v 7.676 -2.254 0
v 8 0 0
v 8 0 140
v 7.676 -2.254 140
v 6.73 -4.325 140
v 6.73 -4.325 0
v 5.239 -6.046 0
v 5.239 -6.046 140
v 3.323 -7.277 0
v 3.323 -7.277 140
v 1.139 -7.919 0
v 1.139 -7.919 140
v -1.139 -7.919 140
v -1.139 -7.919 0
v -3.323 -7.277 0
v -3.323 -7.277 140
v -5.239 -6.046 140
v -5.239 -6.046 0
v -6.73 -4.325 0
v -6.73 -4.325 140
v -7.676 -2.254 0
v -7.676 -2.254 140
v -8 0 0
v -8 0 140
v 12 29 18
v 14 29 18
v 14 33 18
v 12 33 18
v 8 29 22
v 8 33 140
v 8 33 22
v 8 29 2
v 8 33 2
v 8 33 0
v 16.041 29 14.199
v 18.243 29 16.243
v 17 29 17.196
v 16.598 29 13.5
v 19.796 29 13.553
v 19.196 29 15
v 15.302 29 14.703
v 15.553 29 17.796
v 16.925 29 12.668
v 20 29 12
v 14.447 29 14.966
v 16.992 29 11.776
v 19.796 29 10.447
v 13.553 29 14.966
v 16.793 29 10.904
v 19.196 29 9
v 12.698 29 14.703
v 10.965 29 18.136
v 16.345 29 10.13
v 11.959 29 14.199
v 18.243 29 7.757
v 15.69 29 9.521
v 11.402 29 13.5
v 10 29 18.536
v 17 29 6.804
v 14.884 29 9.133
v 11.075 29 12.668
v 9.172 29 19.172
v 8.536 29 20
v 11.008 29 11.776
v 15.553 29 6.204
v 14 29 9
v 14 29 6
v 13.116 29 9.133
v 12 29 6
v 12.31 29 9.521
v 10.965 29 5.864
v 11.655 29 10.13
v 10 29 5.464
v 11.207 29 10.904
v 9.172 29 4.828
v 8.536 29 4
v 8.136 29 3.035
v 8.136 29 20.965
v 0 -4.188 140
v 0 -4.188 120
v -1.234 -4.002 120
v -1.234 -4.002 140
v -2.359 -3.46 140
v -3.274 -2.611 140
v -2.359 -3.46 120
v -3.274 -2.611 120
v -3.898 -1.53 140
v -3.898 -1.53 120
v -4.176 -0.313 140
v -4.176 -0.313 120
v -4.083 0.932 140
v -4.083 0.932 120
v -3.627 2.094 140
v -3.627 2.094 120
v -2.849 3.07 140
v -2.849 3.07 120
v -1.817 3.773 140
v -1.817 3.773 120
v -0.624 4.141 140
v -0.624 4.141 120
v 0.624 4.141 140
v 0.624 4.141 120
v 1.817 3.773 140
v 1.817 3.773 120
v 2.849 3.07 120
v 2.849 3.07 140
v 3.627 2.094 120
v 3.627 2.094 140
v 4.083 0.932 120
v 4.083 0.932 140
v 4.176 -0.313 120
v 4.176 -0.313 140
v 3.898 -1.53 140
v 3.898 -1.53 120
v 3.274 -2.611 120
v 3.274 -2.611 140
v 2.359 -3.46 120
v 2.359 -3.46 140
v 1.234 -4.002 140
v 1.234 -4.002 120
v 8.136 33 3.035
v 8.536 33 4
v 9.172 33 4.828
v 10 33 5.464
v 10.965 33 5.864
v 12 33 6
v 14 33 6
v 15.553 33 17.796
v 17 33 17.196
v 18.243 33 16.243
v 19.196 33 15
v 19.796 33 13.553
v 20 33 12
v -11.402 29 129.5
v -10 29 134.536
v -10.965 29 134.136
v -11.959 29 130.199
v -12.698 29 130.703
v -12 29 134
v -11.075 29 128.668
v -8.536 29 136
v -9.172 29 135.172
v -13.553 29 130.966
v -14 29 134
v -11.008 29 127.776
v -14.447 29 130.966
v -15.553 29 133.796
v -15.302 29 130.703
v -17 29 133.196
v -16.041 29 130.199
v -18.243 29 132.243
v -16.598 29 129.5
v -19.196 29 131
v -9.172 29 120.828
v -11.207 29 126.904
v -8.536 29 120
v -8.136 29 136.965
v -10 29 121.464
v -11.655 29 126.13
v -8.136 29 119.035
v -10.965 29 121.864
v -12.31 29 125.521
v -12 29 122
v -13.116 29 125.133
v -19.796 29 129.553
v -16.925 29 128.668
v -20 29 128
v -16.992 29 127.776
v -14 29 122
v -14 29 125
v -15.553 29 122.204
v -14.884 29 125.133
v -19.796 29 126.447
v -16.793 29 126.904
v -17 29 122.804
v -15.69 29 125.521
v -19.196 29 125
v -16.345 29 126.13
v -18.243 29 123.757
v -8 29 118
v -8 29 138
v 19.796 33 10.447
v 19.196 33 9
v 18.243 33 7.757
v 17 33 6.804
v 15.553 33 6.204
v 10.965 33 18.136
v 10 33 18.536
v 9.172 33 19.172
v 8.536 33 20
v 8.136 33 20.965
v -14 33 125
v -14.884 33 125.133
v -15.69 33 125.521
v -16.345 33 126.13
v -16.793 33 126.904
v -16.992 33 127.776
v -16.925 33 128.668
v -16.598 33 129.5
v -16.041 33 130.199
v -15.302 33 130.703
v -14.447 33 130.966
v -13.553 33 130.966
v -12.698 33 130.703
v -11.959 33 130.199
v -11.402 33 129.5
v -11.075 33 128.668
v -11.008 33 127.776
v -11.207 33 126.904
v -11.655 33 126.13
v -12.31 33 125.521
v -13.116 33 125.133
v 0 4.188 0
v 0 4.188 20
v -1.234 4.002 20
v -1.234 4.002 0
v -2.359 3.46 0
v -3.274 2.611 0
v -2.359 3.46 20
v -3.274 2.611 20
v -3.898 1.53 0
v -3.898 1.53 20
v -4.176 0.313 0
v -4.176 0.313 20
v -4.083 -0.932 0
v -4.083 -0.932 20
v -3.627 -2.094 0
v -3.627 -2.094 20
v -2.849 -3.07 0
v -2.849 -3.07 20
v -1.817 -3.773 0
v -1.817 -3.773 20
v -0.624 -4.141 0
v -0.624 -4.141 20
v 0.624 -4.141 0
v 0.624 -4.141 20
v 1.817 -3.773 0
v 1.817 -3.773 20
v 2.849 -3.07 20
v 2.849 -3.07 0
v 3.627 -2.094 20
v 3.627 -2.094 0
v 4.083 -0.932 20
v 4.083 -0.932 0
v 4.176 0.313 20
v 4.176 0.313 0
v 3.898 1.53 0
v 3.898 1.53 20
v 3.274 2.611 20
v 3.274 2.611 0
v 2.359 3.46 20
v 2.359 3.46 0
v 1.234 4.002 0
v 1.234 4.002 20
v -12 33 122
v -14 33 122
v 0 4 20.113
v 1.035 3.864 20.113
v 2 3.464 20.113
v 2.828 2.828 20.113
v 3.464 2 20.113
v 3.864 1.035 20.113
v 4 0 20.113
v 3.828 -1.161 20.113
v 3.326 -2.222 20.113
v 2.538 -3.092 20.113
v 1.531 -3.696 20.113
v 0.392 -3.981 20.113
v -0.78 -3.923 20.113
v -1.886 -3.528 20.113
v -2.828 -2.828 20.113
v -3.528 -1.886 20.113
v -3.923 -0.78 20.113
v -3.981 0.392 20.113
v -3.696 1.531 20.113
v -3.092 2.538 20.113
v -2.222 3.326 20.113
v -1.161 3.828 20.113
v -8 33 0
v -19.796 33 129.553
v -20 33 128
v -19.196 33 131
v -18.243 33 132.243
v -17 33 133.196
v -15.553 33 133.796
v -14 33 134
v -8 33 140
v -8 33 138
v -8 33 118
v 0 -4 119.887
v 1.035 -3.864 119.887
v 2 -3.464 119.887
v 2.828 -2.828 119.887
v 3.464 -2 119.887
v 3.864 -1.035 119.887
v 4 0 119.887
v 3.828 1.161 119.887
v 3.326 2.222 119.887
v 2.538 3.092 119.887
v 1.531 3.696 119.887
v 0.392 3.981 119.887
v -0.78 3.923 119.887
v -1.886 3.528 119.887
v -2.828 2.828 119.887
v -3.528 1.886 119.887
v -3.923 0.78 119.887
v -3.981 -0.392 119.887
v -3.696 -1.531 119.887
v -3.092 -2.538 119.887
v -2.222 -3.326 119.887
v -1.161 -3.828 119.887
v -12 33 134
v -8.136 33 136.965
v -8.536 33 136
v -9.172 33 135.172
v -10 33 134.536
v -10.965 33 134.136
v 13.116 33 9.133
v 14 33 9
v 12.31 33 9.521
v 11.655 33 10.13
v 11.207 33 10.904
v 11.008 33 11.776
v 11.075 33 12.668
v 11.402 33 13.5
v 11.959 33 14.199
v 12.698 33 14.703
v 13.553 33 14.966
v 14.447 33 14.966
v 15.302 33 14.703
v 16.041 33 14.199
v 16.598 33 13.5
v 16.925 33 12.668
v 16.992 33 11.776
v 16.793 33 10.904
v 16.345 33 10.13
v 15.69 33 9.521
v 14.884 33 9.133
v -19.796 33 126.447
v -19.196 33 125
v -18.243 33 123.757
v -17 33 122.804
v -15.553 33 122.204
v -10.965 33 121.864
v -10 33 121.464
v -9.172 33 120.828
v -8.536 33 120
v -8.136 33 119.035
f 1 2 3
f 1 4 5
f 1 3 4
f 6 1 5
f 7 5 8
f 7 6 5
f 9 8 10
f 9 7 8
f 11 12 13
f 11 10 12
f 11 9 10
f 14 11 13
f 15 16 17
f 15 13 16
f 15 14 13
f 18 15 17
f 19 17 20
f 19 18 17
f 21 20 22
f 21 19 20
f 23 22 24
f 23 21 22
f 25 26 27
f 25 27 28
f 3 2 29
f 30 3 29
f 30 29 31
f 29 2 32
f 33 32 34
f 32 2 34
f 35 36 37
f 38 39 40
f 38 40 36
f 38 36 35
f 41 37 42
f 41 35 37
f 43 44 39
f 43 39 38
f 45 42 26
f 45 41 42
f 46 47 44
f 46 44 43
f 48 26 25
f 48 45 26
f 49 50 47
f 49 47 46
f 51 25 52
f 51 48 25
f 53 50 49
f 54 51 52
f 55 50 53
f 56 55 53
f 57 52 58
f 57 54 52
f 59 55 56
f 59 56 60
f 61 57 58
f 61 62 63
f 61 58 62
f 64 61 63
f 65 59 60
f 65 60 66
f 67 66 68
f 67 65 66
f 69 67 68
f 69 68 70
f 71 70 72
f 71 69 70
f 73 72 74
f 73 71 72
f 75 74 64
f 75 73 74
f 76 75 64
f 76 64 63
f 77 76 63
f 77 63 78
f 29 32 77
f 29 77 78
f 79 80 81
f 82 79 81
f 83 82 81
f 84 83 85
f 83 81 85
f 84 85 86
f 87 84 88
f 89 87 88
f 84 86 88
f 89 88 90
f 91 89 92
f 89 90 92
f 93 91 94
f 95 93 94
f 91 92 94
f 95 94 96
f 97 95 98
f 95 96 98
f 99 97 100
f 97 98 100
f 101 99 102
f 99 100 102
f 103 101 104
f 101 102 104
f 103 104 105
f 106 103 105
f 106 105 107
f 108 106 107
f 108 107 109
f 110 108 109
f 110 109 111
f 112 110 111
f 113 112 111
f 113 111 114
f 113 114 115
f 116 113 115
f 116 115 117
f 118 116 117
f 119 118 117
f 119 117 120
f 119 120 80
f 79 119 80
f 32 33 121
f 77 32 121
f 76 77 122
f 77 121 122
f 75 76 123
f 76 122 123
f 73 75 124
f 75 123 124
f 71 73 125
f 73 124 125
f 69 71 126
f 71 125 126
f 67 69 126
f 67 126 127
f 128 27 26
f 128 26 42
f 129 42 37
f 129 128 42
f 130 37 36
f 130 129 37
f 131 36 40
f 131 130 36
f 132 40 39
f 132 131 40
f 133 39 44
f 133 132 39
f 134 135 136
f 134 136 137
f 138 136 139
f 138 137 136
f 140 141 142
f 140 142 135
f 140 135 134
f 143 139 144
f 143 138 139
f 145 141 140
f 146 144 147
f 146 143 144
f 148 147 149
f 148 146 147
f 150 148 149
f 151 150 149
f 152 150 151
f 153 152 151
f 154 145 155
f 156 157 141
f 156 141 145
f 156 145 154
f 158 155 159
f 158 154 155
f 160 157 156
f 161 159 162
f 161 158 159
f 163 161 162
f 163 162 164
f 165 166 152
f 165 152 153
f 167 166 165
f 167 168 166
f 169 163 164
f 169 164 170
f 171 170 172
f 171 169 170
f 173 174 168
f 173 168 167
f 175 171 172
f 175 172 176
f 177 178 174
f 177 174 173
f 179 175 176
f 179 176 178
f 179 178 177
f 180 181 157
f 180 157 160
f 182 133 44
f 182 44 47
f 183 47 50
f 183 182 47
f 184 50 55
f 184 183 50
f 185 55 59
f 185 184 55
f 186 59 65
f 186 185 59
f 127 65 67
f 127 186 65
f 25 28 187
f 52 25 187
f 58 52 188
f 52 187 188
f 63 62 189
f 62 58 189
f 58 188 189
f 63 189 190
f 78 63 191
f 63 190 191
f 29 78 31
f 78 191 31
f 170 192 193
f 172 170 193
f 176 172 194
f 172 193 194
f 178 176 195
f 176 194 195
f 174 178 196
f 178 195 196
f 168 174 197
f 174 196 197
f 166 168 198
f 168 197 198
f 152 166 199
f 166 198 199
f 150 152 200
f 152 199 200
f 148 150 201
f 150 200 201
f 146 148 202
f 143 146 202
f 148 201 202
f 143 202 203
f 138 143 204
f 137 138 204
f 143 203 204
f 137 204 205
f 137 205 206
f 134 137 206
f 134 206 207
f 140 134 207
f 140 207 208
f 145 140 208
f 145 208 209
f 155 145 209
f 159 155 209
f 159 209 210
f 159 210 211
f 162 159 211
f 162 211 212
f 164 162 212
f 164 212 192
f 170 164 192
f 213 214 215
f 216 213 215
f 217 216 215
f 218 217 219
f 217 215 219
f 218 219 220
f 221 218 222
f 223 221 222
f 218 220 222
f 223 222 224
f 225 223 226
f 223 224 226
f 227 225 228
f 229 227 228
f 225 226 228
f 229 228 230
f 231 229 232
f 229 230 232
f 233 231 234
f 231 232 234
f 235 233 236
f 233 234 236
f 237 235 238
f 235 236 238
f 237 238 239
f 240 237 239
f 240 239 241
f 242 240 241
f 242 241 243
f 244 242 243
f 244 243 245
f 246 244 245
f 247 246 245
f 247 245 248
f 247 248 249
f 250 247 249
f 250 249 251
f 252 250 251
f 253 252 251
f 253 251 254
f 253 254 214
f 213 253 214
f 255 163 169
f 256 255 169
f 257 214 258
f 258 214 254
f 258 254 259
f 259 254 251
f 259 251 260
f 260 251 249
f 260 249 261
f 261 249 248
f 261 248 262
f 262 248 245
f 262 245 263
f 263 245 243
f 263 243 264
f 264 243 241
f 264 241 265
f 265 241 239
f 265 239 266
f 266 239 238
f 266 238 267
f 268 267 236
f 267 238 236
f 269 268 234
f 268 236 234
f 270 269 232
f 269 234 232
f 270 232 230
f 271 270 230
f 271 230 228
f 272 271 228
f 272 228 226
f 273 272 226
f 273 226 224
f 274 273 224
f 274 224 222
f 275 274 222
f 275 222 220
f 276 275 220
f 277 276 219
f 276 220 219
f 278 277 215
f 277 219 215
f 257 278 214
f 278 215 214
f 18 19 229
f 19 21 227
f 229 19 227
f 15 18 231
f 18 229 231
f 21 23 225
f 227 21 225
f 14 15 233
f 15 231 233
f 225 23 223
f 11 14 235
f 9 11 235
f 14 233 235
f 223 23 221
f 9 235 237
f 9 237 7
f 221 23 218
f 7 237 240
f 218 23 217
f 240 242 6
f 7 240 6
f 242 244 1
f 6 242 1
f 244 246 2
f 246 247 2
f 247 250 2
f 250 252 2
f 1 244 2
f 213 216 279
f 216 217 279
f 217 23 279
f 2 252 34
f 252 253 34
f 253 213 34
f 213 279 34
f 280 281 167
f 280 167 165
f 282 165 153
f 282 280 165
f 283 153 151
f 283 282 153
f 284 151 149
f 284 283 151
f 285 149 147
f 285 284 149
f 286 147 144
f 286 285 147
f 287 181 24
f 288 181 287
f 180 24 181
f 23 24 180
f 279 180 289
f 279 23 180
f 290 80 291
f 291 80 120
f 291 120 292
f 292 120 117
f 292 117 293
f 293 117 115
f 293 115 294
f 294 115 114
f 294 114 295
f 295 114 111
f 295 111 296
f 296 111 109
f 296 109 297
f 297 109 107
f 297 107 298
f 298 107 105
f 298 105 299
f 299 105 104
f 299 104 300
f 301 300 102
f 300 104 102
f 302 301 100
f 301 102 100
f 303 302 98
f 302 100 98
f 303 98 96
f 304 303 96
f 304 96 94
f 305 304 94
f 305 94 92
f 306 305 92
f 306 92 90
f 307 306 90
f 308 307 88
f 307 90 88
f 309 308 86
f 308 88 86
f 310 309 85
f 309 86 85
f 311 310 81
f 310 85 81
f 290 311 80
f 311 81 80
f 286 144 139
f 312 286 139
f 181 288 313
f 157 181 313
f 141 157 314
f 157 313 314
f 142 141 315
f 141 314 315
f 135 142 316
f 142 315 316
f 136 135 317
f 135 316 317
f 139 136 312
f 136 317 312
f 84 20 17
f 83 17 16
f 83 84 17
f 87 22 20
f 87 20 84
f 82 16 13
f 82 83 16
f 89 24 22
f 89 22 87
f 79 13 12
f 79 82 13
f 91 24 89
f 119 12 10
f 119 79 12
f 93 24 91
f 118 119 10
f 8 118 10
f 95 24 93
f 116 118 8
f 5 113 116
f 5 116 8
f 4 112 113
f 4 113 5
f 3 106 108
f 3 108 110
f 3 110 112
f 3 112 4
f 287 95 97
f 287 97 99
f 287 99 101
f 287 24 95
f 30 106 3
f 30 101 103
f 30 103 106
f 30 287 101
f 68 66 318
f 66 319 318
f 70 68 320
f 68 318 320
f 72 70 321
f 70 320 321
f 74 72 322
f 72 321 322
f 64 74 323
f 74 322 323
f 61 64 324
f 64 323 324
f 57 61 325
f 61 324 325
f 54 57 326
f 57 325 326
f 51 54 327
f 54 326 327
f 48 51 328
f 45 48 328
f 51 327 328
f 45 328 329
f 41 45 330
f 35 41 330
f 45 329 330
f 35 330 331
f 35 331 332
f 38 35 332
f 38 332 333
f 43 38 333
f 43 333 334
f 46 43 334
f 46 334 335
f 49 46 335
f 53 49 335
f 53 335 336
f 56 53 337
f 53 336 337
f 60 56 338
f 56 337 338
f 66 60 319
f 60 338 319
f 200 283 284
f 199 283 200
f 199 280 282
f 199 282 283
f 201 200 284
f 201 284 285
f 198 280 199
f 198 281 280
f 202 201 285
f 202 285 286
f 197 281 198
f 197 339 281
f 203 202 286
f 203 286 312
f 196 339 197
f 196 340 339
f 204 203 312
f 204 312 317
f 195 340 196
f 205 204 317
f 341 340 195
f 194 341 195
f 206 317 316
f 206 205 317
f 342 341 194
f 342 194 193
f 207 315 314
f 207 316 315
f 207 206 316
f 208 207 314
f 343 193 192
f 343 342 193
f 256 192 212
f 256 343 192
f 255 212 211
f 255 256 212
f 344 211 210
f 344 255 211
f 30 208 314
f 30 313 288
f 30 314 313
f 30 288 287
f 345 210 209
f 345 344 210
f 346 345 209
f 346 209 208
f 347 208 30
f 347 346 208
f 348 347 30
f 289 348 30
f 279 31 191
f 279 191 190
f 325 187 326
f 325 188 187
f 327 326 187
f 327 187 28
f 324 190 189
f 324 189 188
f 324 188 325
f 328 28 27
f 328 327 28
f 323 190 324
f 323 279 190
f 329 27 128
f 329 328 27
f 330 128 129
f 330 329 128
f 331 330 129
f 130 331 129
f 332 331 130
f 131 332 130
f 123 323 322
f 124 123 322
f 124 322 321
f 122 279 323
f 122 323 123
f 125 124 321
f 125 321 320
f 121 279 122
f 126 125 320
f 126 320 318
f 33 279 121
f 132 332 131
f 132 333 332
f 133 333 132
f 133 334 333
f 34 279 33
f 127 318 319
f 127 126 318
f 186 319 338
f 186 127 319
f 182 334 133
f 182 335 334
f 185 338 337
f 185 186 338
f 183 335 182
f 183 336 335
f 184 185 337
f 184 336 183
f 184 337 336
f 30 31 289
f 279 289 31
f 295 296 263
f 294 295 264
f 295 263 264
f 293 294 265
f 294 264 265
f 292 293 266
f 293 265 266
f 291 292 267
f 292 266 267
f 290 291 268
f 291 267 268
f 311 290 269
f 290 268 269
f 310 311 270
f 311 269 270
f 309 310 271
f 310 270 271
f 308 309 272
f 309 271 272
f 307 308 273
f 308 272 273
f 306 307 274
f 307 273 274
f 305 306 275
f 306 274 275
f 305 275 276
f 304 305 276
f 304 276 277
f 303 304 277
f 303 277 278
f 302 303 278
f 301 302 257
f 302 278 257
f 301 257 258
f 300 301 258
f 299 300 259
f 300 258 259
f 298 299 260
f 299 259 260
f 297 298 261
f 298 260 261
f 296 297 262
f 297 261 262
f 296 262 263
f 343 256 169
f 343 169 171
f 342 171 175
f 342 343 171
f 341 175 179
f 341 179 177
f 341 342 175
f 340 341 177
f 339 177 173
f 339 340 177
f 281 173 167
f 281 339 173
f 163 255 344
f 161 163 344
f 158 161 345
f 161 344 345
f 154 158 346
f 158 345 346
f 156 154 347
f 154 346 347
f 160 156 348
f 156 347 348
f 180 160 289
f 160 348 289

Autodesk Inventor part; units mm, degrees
ref_plane "YZ Plane" through (0, 0, 0) normal (1, 0, 0) x (0, 1, 0)
ref_plane "XZ Plane" through (0, 0, 0) normal (0, 1, 0) x (-1, 0, 0)
ref_plane "XY Plane" through (0, 0, 0) normal (0, 0, 1) x (1, 0, 0)
sketch "Sketch7" plane through (0, 0, 0) normal (0, 0, 1) x (1, 0, 0)
  circle A0 centre (0, 0) radius 4
  arc A1 (-8, 0) -> (8, 0) centre (0, 0) ccw
  line L0 (-8, 29) -> (-20, 29)
  line L1 (-20, 29) -> (-20, 33)
  line L2 (-20, 33) -> (0, 33)
  line L3 (0, 33) -> (20, 33)
  line L4 (20, 33) -> (20, 29)
  line L5 (20, 29) -> (8, 29)
  line L6 (-8, 0) -> (-8, 29)
  line L7 (8, 0) -> (8, 29)
  dimension "d34" = 4
  dimension "d35" = 33
  dimension "d36" = 8
  dimension "d37" = 4
  dimension "d38" = 12
extrude "Extrusion6" add sketch "Sketch7" along normal blind 140
sketch "Sketch8" plane through (-20, 29, 0) normal (0, -1, 0) x (1, 0, 0)
  line L0 (12, 140) -> (0, 140) projected
  line L1 (0, 0) -> (0, 140) projected
  line L2 (0, 0) -> (12, 0) projected
  line L3 (12, 0) -> (12, 140) projected
  line L4 (40, 140) -> (28, 140) projected
  line L5 (28, 0) -> (28, 140) projected
  line L6 (28, 0) -> (40, 0) projected
  line L7 (40, 0) -> (40, 140) projected
  line L8 (0, 134) -> (12, 134)
  line L9 (12, 134) -> (12, 122)
  line L10 (12, 122) -> (0, 122)
  line L11 (0, 122) -> (0, 134)
  line L12 (28, 6) -> (40, 6)
  line L13 (40, 6) -> (40, 18)
  line L14 (40, 18) -> (28, 18)
  line L15 (28, 18) -> (28, 6)
  point P0 (20, 0)
  dimension "d41" = 12
  dimension "d42" = 6
  dimension "d43" = 6
extrude "Extrusion7" cut sketch "Sketch8" against normal blind 140 contours L3 L8 L1 L0 | L3 L2 L1 L10 | L7 L14 L5 L4 | L7 L6 L5 L12
fillet "Fillet1" radius 6 4 edges at (20, 31, 6) (20, 31, 18) (-20, 31, 134) (-20, 31, 122)
fillet "Fillet1" radius 4 4 edges at (-8, 31, 134) (-8, 31, 122) (8, 31, 6) (8, 31, 18)
sketch "Sketch9" plane through (-14, 29, 122) normal (0, -1, 0) x (1, 0, 0)
  arc A0 (0, 12) -> (0, 0) centre (0, 6) ccw projected
  arc A1 (28, -116) -> (28, -104) centre (28, -110) ccw projected
  line L0 (28, -104) -> (26, -104) projected
  arc A2 (22, -100) -> (26, -104) centre (26, -100) ccw projected
  line L1 (22, -120) -> (22, -100) projected
  arc A3 (26, -116) -> (22, -120) centre (26, -120) ccw projected
  line L2 (26, -116) -> (28, -116) projected
  point P0 (14, -122)
hole "Hole2" at (14, 29, 12) at (-14, 29, 128) direction (0, 1, 0) diameter 6 depth 8 tip angle 118 clearance for "Flat Head Machine Screw" size "M6" standard "Ansi Metric M Profile"
sketch "Sketch10" plane through (0, 0, 140) normal (0, 0, 1) x (1, 0, 0)
  arc A0 (-8, 0) -> (8, 0) centre (0, 0) ccw projected
hole "Hole3" at (0, 0, 140) direction (0, 0, -1) diameter 8.376 depth 20 tip angle 118 thread size "M10x1.5" class "6H" standard "ANSI Metric M Profile"
sketch "Sketch11" plane through (0, 0, 0) normal (0, 0, -1) x (-1, 0, 0)
  arc A0 (-8, 0) -> (8, 0) centre (0, 0) ccw projected
hole "Hole4" at (0, 0, 0) direction (0, 0, 1) diameter 8.376 depth 20 tip angle 118 thread size "M10x1.5" class "6H" standard "ANSI Metric M Profile"
ref_plane "Work Plane3" through (0, 0, 140) normal (1, 0, 0) x (0, 0, -1)
properties part number "Pusher.Holder" material "Aluminum-6061"
